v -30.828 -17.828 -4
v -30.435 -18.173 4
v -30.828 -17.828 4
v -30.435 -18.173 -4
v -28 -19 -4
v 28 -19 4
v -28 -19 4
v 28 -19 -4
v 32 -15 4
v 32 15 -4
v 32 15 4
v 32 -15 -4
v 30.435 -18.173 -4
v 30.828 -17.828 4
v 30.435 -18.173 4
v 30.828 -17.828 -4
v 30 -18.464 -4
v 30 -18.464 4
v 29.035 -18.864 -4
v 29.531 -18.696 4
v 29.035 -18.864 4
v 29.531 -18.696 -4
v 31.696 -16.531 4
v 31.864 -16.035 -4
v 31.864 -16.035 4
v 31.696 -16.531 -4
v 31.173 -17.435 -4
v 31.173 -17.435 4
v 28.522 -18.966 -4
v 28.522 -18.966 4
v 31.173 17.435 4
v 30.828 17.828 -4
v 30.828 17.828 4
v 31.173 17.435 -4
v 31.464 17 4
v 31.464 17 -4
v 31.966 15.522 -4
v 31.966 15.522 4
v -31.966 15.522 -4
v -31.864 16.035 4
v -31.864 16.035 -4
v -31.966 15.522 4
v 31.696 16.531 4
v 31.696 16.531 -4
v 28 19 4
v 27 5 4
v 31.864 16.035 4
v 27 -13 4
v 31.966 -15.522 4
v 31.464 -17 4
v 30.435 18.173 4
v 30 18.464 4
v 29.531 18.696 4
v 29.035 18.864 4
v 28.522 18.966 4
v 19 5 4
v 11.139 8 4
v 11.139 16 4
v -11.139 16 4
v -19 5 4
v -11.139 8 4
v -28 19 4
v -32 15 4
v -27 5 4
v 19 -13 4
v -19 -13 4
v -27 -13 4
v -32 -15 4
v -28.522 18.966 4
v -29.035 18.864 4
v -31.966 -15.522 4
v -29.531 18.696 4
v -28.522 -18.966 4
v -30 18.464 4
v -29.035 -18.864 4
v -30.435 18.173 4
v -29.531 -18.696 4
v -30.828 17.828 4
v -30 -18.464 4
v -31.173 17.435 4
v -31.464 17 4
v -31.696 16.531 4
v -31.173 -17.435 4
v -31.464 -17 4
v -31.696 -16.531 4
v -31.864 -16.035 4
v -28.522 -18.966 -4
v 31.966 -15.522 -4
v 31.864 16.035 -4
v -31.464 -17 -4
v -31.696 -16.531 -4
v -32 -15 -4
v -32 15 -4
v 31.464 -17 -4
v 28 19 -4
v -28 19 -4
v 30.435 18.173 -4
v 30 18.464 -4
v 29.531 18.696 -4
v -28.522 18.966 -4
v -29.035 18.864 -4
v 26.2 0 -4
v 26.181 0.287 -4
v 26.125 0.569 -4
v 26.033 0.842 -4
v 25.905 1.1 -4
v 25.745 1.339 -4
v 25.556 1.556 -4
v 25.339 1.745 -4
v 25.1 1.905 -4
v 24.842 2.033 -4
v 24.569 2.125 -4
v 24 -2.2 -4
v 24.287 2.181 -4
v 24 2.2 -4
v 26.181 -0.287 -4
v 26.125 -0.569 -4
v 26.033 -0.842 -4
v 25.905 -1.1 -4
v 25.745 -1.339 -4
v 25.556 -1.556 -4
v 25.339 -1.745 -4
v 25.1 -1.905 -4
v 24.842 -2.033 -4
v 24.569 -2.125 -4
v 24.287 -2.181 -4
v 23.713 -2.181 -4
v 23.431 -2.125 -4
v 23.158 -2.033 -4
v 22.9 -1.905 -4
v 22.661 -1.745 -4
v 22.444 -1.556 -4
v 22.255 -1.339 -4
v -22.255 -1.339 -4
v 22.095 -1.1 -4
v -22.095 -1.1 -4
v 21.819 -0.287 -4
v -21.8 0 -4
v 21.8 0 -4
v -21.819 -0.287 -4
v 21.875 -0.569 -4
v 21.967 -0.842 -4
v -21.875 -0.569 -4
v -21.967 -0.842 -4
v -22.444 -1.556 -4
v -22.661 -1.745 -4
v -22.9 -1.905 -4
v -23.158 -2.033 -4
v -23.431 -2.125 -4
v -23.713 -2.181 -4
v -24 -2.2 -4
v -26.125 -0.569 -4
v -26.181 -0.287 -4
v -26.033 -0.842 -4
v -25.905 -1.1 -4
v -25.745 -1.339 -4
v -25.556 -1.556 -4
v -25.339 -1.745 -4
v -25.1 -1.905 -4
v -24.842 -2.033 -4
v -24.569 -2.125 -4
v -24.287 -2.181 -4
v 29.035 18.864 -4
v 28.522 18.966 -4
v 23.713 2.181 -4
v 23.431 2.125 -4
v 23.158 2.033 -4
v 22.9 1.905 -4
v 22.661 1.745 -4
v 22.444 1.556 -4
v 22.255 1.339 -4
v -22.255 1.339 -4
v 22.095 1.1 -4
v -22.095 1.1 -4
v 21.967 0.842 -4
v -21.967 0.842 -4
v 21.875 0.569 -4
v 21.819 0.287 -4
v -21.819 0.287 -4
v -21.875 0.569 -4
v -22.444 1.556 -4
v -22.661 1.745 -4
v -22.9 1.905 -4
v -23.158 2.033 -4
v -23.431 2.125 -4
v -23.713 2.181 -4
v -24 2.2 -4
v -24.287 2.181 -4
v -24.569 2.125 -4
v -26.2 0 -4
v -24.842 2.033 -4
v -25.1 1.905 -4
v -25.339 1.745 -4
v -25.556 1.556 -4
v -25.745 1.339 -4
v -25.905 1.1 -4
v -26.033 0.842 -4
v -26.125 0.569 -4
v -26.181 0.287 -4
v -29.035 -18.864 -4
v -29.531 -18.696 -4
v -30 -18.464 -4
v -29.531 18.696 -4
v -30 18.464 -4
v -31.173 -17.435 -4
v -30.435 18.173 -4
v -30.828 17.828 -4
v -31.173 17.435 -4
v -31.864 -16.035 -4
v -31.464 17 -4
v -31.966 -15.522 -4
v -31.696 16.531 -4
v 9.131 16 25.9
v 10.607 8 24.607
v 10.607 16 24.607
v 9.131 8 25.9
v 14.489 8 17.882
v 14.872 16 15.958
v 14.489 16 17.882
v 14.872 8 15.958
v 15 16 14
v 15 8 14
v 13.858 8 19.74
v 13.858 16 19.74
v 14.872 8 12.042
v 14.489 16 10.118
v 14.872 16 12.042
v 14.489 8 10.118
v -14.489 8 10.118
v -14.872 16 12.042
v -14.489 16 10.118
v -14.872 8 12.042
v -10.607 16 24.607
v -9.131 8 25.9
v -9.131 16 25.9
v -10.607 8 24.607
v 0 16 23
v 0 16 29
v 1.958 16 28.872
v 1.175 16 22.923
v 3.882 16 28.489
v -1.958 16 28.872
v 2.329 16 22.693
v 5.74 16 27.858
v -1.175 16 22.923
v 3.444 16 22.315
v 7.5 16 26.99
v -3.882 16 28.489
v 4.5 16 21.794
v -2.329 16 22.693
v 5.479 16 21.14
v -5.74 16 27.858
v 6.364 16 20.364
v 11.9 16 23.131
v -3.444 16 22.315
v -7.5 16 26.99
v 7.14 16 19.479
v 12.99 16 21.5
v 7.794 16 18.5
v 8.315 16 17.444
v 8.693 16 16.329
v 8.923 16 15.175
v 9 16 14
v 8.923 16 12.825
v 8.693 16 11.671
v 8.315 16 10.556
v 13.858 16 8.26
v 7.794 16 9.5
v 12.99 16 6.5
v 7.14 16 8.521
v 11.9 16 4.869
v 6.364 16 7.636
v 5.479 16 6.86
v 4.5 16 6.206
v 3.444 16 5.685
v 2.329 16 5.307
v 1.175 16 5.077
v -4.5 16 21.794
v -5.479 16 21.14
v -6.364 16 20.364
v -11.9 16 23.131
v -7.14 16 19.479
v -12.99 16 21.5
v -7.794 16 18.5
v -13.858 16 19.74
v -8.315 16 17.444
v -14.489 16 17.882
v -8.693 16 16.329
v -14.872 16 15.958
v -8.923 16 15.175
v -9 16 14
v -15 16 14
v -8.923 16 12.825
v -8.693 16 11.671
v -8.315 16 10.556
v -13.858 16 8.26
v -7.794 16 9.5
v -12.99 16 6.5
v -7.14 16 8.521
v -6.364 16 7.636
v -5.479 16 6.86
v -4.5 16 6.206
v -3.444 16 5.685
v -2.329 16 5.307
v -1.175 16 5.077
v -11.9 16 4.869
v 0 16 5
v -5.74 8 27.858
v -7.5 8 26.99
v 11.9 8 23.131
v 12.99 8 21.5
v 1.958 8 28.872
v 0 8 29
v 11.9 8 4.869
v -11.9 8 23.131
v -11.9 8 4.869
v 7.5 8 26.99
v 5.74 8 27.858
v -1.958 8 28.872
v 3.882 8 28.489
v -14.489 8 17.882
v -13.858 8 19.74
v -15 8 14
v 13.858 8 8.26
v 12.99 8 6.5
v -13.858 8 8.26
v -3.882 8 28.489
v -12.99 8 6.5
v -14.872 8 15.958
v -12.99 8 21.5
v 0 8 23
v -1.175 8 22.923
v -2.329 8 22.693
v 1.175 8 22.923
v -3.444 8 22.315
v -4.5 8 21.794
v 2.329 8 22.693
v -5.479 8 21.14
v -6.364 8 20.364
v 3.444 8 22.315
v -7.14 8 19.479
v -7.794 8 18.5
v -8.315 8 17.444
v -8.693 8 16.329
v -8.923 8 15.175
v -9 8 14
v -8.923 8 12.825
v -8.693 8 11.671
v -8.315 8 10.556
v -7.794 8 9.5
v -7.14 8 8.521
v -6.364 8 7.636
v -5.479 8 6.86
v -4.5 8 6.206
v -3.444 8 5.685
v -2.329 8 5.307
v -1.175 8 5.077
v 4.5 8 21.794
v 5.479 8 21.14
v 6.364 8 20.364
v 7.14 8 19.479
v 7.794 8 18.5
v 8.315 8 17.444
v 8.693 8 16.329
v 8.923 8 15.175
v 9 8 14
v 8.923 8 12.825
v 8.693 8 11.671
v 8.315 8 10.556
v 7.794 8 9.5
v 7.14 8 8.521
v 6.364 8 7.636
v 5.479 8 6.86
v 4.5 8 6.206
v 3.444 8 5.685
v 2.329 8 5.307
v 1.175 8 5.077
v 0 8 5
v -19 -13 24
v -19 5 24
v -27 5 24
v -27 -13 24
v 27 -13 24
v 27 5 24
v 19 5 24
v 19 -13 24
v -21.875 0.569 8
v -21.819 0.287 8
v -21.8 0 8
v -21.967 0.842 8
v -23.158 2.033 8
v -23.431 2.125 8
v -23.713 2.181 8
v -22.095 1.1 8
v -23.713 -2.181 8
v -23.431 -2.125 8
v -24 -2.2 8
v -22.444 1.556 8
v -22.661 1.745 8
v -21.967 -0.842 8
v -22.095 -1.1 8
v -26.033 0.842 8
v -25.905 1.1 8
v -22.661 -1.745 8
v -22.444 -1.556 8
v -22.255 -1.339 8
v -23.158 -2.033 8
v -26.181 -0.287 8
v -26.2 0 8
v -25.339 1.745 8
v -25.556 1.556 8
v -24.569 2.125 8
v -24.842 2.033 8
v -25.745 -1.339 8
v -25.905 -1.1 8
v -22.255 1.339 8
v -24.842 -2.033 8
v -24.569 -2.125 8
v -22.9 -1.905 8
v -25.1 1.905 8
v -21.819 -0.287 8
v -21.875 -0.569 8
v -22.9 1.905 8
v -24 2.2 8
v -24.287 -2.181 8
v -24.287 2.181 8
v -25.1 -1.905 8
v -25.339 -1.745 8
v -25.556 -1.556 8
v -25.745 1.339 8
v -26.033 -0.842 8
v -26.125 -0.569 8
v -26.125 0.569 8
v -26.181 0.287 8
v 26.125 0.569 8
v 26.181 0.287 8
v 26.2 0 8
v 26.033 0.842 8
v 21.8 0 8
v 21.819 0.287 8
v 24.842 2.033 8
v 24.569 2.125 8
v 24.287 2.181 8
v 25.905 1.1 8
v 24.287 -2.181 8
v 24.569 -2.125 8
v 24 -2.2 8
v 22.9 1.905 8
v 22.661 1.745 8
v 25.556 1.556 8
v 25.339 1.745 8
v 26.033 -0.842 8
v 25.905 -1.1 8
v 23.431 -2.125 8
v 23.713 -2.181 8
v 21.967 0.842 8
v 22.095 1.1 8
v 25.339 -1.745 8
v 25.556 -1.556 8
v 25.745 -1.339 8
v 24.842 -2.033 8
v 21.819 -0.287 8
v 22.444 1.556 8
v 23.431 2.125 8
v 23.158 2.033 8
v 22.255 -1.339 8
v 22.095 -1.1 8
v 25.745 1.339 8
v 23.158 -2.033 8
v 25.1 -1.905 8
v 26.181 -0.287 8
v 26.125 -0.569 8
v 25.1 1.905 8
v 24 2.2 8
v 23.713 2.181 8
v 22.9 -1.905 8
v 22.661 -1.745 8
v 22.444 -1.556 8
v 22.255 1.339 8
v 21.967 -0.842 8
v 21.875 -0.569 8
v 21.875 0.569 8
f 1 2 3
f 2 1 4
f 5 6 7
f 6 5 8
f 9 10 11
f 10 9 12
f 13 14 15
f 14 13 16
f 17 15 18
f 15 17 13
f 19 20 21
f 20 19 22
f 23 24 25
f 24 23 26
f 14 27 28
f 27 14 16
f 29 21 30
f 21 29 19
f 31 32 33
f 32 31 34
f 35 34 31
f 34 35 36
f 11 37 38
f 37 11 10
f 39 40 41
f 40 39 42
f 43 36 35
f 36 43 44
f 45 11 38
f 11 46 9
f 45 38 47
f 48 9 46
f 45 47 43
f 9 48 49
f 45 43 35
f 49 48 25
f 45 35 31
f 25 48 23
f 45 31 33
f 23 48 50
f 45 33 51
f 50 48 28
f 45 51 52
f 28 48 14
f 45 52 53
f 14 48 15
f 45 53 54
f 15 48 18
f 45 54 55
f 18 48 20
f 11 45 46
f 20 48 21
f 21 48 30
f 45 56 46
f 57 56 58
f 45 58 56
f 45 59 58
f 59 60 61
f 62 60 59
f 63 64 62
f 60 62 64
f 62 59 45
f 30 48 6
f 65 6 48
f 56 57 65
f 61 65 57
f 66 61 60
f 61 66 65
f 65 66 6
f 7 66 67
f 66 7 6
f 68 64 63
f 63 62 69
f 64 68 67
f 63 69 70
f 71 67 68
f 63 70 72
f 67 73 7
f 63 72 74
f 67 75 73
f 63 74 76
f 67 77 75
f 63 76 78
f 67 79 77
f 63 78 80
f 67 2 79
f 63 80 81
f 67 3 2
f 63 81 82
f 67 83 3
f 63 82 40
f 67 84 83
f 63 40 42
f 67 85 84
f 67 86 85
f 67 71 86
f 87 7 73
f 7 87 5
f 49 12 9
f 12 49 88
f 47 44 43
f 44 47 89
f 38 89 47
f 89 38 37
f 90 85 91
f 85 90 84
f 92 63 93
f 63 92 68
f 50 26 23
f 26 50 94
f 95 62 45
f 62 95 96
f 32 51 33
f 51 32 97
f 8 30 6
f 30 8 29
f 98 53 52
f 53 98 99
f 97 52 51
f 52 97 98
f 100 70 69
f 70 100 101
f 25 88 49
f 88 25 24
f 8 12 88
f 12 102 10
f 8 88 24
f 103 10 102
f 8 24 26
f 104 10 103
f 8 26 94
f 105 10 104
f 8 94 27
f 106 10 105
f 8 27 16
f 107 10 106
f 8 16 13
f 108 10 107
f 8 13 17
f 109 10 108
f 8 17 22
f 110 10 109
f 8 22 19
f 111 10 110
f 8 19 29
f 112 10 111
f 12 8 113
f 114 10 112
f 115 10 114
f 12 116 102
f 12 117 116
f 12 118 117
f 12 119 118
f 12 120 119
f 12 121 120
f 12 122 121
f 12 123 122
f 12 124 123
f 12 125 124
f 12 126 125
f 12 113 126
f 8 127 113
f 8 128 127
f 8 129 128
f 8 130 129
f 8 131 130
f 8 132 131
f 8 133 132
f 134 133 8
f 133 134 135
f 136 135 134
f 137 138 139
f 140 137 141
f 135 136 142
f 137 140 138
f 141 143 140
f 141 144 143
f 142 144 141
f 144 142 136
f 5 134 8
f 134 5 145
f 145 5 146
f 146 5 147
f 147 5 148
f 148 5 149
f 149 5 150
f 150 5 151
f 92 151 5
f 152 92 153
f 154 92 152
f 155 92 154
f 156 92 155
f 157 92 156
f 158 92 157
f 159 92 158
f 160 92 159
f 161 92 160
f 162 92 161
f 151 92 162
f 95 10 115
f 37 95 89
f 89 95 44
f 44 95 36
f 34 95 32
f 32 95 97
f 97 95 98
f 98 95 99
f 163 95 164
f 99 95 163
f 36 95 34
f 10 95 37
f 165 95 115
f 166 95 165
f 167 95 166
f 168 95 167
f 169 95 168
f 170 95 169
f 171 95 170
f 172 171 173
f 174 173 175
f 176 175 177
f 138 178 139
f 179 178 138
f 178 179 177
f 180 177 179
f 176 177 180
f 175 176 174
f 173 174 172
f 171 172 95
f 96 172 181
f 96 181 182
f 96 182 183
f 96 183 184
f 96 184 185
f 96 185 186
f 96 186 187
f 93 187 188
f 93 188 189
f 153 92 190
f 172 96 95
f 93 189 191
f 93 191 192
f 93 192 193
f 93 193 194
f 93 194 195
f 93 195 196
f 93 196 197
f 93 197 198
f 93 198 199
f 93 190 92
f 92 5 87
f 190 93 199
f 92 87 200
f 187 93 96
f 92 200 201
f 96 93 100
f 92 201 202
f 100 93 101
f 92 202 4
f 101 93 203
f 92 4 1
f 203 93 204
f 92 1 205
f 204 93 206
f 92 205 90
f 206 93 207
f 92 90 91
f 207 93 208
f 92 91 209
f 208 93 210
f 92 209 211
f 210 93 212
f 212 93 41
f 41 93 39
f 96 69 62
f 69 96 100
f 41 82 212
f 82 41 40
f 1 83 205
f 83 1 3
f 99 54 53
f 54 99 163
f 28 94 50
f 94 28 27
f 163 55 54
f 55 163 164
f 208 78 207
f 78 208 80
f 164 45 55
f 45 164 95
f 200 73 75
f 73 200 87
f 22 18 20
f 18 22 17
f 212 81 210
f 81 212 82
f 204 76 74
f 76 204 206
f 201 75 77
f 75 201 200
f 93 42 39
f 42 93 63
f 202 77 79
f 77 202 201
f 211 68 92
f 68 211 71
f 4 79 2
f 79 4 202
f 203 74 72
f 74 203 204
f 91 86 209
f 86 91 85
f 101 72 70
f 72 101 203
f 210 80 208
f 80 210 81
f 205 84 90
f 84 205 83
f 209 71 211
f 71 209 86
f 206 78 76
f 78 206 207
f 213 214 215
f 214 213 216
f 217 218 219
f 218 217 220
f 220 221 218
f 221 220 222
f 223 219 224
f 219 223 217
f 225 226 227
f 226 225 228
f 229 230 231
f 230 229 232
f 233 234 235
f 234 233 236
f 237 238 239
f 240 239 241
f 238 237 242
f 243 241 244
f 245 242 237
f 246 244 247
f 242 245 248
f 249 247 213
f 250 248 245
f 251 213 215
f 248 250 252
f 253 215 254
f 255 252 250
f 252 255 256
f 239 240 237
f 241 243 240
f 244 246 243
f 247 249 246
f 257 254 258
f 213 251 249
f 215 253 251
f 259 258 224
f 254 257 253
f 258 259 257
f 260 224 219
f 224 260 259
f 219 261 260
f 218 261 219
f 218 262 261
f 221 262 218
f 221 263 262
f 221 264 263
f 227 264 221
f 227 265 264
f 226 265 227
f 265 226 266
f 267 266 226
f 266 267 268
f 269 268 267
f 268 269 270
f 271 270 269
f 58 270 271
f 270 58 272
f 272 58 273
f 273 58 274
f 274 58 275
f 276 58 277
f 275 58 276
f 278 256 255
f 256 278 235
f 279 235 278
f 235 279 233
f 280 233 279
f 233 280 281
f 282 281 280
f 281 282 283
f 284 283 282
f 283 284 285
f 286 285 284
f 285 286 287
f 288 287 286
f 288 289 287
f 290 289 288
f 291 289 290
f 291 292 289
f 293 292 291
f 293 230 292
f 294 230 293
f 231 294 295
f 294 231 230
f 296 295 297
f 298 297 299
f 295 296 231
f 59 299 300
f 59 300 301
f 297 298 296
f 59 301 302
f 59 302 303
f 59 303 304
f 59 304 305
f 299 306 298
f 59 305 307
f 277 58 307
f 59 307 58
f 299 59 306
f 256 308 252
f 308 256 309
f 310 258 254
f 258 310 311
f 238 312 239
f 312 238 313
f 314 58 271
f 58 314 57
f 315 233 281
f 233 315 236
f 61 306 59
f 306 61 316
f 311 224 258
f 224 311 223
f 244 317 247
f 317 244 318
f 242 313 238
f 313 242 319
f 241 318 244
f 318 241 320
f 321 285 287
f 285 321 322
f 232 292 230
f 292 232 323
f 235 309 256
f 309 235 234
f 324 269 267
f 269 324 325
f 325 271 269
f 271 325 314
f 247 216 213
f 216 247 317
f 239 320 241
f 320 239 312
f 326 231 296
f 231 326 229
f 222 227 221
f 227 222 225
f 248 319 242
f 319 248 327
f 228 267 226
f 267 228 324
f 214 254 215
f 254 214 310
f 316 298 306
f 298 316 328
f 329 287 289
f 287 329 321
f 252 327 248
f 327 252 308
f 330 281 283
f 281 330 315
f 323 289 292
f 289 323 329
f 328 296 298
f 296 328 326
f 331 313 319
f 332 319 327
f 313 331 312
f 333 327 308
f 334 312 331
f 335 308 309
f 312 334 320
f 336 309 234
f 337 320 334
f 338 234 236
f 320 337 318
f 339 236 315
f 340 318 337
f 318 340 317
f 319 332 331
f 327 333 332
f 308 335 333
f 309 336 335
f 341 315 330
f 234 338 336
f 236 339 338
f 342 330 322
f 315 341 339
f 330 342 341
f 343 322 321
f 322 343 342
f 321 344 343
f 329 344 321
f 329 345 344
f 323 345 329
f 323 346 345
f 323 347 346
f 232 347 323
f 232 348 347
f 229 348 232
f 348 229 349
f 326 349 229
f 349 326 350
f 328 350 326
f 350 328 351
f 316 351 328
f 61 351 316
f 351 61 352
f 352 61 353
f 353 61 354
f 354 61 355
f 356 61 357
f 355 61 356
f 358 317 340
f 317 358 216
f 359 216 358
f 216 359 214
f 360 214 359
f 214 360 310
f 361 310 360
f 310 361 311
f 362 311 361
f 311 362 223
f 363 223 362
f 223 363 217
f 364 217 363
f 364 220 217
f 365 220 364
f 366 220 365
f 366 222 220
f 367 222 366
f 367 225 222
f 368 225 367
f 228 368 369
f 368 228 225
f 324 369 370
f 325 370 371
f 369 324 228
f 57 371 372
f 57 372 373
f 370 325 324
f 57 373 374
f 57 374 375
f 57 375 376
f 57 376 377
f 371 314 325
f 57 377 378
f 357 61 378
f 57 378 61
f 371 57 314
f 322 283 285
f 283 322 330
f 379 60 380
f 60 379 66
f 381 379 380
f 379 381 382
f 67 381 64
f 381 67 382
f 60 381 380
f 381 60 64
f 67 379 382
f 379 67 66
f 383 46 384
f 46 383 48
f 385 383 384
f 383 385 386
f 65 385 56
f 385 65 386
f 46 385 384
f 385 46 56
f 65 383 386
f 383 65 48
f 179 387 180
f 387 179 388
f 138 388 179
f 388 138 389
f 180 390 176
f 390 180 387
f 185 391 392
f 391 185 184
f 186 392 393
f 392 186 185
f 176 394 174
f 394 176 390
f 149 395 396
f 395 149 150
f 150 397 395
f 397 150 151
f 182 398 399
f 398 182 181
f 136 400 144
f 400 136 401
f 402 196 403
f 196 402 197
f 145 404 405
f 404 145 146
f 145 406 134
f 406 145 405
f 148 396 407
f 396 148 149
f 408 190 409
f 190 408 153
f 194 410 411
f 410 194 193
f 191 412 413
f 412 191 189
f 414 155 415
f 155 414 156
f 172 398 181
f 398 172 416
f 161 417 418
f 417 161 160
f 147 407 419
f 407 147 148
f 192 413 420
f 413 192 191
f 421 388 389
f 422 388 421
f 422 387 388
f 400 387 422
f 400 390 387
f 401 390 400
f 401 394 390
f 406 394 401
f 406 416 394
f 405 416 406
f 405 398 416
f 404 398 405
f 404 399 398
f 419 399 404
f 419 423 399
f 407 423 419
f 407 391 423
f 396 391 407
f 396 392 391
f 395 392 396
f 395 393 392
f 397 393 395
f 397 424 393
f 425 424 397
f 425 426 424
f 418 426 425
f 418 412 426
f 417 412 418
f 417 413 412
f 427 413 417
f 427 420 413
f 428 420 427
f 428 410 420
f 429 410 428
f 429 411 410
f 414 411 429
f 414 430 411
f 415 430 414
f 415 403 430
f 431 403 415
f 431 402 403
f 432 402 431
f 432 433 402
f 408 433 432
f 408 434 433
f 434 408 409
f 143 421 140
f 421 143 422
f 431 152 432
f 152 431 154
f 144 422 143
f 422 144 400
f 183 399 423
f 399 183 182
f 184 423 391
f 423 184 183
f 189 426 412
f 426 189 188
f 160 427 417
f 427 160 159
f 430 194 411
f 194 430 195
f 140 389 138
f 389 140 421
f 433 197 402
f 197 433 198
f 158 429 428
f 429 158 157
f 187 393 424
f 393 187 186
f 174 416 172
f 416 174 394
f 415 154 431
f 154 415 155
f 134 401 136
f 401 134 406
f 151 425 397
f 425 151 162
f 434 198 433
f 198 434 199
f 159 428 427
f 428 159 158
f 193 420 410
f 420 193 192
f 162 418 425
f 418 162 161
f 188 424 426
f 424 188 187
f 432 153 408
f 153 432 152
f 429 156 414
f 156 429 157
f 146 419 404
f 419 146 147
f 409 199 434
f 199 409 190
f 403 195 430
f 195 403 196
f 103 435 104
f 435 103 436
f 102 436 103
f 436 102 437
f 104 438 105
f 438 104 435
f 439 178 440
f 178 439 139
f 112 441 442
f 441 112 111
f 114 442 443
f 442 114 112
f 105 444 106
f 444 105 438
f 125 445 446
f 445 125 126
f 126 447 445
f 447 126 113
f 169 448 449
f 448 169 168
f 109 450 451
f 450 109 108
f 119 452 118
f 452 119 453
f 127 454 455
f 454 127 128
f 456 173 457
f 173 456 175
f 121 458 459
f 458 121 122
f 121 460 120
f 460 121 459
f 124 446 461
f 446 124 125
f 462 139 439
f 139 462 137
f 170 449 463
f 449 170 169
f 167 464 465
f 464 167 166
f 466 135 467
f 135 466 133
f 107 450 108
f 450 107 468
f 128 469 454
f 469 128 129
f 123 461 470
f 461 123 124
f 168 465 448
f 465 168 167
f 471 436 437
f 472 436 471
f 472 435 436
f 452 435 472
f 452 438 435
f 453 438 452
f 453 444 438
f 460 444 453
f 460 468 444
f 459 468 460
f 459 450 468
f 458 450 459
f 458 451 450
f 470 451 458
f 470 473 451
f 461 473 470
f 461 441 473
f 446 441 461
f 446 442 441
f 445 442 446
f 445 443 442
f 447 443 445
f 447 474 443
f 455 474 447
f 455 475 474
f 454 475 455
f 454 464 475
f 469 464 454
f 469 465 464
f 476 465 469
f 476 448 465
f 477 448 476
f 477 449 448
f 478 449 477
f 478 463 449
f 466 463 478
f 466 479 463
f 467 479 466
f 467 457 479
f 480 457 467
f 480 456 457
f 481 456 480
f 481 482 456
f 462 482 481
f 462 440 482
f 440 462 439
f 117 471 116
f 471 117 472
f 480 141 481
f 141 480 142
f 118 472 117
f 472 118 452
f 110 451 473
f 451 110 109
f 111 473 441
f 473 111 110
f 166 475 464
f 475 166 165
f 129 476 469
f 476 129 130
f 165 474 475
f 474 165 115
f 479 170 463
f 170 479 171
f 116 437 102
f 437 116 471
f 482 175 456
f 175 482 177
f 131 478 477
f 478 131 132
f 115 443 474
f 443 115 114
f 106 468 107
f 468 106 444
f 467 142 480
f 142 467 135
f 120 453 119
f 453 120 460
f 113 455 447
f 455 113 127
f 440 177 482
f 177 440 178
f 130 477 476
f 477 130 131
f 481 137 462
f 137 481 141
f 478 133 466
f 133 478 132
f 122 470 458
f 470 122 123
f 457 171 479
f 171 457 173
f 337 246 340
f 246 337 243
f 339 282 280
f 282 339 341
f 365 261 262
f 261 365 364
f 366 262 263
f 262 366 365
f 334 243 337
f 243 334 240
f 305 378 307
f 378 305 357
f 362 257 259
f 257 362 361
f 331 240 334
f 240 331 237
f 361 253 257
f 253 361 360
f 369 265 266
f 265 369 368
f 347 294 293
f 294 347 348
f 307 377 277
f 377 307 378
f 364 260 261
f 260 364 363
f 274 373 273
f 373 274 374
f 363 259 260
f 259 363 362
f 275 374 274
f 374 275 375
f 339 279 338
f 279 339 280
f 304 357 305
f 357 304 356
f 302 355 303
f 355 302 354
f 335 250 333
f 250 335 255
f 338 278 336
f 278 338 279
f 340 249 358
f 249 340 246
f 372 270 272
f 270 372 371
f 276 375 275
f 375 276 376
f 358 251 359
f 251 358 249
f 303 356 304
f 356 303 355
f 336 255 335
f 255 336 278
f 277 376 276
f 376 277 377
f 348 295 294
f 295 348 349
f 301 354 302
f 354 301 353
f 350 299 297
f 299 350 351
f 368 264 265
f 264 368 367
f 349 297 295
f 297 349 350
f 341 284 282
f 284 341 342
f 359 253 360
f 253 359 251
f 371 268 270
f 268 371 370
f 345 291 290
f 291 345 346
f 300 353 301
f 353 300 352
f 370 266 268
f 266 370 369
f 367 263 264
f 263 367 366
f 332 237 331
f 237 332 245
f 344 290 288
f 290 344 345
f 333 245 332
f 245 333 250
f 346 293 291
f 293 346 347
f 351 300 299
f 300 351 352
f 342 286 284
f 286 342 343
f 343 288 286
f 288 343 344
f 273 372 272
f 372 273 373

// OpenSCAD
$fn = 48;

module rounded_block(size = [64, 38, 8], radius = 4) {
    hull() {
        for (x = [-size.x / 2 + radius, size.x / 2 - radius])
            for (y = [-size.y / 2 + radius, size.y / 2 - radius])
                translate([x, y, 0]) cylinder(h = size.z, r = radius, center = true);
    }
}

difference() {
    union() {
        rounded_block();
        translate([0, 12, 14]) rotate([90, 0, 0])
            cylinder(h = 8, r = 15, center = true);
        translate([-23, -4, 12]) cube([8, 18, 24], center = true);
        translate([23, -4, 12]) cube([8, 18, 24], center = true);
    }

    translate([0, 12, 14]) rotate([90, 0, 0])
        cylinder(h = 12, r = 9, center = true);

    for (x = [-24, 24])
        translate([x, 0, 0]) cylinder(h = 16, r = 2.2, center = true);
}
